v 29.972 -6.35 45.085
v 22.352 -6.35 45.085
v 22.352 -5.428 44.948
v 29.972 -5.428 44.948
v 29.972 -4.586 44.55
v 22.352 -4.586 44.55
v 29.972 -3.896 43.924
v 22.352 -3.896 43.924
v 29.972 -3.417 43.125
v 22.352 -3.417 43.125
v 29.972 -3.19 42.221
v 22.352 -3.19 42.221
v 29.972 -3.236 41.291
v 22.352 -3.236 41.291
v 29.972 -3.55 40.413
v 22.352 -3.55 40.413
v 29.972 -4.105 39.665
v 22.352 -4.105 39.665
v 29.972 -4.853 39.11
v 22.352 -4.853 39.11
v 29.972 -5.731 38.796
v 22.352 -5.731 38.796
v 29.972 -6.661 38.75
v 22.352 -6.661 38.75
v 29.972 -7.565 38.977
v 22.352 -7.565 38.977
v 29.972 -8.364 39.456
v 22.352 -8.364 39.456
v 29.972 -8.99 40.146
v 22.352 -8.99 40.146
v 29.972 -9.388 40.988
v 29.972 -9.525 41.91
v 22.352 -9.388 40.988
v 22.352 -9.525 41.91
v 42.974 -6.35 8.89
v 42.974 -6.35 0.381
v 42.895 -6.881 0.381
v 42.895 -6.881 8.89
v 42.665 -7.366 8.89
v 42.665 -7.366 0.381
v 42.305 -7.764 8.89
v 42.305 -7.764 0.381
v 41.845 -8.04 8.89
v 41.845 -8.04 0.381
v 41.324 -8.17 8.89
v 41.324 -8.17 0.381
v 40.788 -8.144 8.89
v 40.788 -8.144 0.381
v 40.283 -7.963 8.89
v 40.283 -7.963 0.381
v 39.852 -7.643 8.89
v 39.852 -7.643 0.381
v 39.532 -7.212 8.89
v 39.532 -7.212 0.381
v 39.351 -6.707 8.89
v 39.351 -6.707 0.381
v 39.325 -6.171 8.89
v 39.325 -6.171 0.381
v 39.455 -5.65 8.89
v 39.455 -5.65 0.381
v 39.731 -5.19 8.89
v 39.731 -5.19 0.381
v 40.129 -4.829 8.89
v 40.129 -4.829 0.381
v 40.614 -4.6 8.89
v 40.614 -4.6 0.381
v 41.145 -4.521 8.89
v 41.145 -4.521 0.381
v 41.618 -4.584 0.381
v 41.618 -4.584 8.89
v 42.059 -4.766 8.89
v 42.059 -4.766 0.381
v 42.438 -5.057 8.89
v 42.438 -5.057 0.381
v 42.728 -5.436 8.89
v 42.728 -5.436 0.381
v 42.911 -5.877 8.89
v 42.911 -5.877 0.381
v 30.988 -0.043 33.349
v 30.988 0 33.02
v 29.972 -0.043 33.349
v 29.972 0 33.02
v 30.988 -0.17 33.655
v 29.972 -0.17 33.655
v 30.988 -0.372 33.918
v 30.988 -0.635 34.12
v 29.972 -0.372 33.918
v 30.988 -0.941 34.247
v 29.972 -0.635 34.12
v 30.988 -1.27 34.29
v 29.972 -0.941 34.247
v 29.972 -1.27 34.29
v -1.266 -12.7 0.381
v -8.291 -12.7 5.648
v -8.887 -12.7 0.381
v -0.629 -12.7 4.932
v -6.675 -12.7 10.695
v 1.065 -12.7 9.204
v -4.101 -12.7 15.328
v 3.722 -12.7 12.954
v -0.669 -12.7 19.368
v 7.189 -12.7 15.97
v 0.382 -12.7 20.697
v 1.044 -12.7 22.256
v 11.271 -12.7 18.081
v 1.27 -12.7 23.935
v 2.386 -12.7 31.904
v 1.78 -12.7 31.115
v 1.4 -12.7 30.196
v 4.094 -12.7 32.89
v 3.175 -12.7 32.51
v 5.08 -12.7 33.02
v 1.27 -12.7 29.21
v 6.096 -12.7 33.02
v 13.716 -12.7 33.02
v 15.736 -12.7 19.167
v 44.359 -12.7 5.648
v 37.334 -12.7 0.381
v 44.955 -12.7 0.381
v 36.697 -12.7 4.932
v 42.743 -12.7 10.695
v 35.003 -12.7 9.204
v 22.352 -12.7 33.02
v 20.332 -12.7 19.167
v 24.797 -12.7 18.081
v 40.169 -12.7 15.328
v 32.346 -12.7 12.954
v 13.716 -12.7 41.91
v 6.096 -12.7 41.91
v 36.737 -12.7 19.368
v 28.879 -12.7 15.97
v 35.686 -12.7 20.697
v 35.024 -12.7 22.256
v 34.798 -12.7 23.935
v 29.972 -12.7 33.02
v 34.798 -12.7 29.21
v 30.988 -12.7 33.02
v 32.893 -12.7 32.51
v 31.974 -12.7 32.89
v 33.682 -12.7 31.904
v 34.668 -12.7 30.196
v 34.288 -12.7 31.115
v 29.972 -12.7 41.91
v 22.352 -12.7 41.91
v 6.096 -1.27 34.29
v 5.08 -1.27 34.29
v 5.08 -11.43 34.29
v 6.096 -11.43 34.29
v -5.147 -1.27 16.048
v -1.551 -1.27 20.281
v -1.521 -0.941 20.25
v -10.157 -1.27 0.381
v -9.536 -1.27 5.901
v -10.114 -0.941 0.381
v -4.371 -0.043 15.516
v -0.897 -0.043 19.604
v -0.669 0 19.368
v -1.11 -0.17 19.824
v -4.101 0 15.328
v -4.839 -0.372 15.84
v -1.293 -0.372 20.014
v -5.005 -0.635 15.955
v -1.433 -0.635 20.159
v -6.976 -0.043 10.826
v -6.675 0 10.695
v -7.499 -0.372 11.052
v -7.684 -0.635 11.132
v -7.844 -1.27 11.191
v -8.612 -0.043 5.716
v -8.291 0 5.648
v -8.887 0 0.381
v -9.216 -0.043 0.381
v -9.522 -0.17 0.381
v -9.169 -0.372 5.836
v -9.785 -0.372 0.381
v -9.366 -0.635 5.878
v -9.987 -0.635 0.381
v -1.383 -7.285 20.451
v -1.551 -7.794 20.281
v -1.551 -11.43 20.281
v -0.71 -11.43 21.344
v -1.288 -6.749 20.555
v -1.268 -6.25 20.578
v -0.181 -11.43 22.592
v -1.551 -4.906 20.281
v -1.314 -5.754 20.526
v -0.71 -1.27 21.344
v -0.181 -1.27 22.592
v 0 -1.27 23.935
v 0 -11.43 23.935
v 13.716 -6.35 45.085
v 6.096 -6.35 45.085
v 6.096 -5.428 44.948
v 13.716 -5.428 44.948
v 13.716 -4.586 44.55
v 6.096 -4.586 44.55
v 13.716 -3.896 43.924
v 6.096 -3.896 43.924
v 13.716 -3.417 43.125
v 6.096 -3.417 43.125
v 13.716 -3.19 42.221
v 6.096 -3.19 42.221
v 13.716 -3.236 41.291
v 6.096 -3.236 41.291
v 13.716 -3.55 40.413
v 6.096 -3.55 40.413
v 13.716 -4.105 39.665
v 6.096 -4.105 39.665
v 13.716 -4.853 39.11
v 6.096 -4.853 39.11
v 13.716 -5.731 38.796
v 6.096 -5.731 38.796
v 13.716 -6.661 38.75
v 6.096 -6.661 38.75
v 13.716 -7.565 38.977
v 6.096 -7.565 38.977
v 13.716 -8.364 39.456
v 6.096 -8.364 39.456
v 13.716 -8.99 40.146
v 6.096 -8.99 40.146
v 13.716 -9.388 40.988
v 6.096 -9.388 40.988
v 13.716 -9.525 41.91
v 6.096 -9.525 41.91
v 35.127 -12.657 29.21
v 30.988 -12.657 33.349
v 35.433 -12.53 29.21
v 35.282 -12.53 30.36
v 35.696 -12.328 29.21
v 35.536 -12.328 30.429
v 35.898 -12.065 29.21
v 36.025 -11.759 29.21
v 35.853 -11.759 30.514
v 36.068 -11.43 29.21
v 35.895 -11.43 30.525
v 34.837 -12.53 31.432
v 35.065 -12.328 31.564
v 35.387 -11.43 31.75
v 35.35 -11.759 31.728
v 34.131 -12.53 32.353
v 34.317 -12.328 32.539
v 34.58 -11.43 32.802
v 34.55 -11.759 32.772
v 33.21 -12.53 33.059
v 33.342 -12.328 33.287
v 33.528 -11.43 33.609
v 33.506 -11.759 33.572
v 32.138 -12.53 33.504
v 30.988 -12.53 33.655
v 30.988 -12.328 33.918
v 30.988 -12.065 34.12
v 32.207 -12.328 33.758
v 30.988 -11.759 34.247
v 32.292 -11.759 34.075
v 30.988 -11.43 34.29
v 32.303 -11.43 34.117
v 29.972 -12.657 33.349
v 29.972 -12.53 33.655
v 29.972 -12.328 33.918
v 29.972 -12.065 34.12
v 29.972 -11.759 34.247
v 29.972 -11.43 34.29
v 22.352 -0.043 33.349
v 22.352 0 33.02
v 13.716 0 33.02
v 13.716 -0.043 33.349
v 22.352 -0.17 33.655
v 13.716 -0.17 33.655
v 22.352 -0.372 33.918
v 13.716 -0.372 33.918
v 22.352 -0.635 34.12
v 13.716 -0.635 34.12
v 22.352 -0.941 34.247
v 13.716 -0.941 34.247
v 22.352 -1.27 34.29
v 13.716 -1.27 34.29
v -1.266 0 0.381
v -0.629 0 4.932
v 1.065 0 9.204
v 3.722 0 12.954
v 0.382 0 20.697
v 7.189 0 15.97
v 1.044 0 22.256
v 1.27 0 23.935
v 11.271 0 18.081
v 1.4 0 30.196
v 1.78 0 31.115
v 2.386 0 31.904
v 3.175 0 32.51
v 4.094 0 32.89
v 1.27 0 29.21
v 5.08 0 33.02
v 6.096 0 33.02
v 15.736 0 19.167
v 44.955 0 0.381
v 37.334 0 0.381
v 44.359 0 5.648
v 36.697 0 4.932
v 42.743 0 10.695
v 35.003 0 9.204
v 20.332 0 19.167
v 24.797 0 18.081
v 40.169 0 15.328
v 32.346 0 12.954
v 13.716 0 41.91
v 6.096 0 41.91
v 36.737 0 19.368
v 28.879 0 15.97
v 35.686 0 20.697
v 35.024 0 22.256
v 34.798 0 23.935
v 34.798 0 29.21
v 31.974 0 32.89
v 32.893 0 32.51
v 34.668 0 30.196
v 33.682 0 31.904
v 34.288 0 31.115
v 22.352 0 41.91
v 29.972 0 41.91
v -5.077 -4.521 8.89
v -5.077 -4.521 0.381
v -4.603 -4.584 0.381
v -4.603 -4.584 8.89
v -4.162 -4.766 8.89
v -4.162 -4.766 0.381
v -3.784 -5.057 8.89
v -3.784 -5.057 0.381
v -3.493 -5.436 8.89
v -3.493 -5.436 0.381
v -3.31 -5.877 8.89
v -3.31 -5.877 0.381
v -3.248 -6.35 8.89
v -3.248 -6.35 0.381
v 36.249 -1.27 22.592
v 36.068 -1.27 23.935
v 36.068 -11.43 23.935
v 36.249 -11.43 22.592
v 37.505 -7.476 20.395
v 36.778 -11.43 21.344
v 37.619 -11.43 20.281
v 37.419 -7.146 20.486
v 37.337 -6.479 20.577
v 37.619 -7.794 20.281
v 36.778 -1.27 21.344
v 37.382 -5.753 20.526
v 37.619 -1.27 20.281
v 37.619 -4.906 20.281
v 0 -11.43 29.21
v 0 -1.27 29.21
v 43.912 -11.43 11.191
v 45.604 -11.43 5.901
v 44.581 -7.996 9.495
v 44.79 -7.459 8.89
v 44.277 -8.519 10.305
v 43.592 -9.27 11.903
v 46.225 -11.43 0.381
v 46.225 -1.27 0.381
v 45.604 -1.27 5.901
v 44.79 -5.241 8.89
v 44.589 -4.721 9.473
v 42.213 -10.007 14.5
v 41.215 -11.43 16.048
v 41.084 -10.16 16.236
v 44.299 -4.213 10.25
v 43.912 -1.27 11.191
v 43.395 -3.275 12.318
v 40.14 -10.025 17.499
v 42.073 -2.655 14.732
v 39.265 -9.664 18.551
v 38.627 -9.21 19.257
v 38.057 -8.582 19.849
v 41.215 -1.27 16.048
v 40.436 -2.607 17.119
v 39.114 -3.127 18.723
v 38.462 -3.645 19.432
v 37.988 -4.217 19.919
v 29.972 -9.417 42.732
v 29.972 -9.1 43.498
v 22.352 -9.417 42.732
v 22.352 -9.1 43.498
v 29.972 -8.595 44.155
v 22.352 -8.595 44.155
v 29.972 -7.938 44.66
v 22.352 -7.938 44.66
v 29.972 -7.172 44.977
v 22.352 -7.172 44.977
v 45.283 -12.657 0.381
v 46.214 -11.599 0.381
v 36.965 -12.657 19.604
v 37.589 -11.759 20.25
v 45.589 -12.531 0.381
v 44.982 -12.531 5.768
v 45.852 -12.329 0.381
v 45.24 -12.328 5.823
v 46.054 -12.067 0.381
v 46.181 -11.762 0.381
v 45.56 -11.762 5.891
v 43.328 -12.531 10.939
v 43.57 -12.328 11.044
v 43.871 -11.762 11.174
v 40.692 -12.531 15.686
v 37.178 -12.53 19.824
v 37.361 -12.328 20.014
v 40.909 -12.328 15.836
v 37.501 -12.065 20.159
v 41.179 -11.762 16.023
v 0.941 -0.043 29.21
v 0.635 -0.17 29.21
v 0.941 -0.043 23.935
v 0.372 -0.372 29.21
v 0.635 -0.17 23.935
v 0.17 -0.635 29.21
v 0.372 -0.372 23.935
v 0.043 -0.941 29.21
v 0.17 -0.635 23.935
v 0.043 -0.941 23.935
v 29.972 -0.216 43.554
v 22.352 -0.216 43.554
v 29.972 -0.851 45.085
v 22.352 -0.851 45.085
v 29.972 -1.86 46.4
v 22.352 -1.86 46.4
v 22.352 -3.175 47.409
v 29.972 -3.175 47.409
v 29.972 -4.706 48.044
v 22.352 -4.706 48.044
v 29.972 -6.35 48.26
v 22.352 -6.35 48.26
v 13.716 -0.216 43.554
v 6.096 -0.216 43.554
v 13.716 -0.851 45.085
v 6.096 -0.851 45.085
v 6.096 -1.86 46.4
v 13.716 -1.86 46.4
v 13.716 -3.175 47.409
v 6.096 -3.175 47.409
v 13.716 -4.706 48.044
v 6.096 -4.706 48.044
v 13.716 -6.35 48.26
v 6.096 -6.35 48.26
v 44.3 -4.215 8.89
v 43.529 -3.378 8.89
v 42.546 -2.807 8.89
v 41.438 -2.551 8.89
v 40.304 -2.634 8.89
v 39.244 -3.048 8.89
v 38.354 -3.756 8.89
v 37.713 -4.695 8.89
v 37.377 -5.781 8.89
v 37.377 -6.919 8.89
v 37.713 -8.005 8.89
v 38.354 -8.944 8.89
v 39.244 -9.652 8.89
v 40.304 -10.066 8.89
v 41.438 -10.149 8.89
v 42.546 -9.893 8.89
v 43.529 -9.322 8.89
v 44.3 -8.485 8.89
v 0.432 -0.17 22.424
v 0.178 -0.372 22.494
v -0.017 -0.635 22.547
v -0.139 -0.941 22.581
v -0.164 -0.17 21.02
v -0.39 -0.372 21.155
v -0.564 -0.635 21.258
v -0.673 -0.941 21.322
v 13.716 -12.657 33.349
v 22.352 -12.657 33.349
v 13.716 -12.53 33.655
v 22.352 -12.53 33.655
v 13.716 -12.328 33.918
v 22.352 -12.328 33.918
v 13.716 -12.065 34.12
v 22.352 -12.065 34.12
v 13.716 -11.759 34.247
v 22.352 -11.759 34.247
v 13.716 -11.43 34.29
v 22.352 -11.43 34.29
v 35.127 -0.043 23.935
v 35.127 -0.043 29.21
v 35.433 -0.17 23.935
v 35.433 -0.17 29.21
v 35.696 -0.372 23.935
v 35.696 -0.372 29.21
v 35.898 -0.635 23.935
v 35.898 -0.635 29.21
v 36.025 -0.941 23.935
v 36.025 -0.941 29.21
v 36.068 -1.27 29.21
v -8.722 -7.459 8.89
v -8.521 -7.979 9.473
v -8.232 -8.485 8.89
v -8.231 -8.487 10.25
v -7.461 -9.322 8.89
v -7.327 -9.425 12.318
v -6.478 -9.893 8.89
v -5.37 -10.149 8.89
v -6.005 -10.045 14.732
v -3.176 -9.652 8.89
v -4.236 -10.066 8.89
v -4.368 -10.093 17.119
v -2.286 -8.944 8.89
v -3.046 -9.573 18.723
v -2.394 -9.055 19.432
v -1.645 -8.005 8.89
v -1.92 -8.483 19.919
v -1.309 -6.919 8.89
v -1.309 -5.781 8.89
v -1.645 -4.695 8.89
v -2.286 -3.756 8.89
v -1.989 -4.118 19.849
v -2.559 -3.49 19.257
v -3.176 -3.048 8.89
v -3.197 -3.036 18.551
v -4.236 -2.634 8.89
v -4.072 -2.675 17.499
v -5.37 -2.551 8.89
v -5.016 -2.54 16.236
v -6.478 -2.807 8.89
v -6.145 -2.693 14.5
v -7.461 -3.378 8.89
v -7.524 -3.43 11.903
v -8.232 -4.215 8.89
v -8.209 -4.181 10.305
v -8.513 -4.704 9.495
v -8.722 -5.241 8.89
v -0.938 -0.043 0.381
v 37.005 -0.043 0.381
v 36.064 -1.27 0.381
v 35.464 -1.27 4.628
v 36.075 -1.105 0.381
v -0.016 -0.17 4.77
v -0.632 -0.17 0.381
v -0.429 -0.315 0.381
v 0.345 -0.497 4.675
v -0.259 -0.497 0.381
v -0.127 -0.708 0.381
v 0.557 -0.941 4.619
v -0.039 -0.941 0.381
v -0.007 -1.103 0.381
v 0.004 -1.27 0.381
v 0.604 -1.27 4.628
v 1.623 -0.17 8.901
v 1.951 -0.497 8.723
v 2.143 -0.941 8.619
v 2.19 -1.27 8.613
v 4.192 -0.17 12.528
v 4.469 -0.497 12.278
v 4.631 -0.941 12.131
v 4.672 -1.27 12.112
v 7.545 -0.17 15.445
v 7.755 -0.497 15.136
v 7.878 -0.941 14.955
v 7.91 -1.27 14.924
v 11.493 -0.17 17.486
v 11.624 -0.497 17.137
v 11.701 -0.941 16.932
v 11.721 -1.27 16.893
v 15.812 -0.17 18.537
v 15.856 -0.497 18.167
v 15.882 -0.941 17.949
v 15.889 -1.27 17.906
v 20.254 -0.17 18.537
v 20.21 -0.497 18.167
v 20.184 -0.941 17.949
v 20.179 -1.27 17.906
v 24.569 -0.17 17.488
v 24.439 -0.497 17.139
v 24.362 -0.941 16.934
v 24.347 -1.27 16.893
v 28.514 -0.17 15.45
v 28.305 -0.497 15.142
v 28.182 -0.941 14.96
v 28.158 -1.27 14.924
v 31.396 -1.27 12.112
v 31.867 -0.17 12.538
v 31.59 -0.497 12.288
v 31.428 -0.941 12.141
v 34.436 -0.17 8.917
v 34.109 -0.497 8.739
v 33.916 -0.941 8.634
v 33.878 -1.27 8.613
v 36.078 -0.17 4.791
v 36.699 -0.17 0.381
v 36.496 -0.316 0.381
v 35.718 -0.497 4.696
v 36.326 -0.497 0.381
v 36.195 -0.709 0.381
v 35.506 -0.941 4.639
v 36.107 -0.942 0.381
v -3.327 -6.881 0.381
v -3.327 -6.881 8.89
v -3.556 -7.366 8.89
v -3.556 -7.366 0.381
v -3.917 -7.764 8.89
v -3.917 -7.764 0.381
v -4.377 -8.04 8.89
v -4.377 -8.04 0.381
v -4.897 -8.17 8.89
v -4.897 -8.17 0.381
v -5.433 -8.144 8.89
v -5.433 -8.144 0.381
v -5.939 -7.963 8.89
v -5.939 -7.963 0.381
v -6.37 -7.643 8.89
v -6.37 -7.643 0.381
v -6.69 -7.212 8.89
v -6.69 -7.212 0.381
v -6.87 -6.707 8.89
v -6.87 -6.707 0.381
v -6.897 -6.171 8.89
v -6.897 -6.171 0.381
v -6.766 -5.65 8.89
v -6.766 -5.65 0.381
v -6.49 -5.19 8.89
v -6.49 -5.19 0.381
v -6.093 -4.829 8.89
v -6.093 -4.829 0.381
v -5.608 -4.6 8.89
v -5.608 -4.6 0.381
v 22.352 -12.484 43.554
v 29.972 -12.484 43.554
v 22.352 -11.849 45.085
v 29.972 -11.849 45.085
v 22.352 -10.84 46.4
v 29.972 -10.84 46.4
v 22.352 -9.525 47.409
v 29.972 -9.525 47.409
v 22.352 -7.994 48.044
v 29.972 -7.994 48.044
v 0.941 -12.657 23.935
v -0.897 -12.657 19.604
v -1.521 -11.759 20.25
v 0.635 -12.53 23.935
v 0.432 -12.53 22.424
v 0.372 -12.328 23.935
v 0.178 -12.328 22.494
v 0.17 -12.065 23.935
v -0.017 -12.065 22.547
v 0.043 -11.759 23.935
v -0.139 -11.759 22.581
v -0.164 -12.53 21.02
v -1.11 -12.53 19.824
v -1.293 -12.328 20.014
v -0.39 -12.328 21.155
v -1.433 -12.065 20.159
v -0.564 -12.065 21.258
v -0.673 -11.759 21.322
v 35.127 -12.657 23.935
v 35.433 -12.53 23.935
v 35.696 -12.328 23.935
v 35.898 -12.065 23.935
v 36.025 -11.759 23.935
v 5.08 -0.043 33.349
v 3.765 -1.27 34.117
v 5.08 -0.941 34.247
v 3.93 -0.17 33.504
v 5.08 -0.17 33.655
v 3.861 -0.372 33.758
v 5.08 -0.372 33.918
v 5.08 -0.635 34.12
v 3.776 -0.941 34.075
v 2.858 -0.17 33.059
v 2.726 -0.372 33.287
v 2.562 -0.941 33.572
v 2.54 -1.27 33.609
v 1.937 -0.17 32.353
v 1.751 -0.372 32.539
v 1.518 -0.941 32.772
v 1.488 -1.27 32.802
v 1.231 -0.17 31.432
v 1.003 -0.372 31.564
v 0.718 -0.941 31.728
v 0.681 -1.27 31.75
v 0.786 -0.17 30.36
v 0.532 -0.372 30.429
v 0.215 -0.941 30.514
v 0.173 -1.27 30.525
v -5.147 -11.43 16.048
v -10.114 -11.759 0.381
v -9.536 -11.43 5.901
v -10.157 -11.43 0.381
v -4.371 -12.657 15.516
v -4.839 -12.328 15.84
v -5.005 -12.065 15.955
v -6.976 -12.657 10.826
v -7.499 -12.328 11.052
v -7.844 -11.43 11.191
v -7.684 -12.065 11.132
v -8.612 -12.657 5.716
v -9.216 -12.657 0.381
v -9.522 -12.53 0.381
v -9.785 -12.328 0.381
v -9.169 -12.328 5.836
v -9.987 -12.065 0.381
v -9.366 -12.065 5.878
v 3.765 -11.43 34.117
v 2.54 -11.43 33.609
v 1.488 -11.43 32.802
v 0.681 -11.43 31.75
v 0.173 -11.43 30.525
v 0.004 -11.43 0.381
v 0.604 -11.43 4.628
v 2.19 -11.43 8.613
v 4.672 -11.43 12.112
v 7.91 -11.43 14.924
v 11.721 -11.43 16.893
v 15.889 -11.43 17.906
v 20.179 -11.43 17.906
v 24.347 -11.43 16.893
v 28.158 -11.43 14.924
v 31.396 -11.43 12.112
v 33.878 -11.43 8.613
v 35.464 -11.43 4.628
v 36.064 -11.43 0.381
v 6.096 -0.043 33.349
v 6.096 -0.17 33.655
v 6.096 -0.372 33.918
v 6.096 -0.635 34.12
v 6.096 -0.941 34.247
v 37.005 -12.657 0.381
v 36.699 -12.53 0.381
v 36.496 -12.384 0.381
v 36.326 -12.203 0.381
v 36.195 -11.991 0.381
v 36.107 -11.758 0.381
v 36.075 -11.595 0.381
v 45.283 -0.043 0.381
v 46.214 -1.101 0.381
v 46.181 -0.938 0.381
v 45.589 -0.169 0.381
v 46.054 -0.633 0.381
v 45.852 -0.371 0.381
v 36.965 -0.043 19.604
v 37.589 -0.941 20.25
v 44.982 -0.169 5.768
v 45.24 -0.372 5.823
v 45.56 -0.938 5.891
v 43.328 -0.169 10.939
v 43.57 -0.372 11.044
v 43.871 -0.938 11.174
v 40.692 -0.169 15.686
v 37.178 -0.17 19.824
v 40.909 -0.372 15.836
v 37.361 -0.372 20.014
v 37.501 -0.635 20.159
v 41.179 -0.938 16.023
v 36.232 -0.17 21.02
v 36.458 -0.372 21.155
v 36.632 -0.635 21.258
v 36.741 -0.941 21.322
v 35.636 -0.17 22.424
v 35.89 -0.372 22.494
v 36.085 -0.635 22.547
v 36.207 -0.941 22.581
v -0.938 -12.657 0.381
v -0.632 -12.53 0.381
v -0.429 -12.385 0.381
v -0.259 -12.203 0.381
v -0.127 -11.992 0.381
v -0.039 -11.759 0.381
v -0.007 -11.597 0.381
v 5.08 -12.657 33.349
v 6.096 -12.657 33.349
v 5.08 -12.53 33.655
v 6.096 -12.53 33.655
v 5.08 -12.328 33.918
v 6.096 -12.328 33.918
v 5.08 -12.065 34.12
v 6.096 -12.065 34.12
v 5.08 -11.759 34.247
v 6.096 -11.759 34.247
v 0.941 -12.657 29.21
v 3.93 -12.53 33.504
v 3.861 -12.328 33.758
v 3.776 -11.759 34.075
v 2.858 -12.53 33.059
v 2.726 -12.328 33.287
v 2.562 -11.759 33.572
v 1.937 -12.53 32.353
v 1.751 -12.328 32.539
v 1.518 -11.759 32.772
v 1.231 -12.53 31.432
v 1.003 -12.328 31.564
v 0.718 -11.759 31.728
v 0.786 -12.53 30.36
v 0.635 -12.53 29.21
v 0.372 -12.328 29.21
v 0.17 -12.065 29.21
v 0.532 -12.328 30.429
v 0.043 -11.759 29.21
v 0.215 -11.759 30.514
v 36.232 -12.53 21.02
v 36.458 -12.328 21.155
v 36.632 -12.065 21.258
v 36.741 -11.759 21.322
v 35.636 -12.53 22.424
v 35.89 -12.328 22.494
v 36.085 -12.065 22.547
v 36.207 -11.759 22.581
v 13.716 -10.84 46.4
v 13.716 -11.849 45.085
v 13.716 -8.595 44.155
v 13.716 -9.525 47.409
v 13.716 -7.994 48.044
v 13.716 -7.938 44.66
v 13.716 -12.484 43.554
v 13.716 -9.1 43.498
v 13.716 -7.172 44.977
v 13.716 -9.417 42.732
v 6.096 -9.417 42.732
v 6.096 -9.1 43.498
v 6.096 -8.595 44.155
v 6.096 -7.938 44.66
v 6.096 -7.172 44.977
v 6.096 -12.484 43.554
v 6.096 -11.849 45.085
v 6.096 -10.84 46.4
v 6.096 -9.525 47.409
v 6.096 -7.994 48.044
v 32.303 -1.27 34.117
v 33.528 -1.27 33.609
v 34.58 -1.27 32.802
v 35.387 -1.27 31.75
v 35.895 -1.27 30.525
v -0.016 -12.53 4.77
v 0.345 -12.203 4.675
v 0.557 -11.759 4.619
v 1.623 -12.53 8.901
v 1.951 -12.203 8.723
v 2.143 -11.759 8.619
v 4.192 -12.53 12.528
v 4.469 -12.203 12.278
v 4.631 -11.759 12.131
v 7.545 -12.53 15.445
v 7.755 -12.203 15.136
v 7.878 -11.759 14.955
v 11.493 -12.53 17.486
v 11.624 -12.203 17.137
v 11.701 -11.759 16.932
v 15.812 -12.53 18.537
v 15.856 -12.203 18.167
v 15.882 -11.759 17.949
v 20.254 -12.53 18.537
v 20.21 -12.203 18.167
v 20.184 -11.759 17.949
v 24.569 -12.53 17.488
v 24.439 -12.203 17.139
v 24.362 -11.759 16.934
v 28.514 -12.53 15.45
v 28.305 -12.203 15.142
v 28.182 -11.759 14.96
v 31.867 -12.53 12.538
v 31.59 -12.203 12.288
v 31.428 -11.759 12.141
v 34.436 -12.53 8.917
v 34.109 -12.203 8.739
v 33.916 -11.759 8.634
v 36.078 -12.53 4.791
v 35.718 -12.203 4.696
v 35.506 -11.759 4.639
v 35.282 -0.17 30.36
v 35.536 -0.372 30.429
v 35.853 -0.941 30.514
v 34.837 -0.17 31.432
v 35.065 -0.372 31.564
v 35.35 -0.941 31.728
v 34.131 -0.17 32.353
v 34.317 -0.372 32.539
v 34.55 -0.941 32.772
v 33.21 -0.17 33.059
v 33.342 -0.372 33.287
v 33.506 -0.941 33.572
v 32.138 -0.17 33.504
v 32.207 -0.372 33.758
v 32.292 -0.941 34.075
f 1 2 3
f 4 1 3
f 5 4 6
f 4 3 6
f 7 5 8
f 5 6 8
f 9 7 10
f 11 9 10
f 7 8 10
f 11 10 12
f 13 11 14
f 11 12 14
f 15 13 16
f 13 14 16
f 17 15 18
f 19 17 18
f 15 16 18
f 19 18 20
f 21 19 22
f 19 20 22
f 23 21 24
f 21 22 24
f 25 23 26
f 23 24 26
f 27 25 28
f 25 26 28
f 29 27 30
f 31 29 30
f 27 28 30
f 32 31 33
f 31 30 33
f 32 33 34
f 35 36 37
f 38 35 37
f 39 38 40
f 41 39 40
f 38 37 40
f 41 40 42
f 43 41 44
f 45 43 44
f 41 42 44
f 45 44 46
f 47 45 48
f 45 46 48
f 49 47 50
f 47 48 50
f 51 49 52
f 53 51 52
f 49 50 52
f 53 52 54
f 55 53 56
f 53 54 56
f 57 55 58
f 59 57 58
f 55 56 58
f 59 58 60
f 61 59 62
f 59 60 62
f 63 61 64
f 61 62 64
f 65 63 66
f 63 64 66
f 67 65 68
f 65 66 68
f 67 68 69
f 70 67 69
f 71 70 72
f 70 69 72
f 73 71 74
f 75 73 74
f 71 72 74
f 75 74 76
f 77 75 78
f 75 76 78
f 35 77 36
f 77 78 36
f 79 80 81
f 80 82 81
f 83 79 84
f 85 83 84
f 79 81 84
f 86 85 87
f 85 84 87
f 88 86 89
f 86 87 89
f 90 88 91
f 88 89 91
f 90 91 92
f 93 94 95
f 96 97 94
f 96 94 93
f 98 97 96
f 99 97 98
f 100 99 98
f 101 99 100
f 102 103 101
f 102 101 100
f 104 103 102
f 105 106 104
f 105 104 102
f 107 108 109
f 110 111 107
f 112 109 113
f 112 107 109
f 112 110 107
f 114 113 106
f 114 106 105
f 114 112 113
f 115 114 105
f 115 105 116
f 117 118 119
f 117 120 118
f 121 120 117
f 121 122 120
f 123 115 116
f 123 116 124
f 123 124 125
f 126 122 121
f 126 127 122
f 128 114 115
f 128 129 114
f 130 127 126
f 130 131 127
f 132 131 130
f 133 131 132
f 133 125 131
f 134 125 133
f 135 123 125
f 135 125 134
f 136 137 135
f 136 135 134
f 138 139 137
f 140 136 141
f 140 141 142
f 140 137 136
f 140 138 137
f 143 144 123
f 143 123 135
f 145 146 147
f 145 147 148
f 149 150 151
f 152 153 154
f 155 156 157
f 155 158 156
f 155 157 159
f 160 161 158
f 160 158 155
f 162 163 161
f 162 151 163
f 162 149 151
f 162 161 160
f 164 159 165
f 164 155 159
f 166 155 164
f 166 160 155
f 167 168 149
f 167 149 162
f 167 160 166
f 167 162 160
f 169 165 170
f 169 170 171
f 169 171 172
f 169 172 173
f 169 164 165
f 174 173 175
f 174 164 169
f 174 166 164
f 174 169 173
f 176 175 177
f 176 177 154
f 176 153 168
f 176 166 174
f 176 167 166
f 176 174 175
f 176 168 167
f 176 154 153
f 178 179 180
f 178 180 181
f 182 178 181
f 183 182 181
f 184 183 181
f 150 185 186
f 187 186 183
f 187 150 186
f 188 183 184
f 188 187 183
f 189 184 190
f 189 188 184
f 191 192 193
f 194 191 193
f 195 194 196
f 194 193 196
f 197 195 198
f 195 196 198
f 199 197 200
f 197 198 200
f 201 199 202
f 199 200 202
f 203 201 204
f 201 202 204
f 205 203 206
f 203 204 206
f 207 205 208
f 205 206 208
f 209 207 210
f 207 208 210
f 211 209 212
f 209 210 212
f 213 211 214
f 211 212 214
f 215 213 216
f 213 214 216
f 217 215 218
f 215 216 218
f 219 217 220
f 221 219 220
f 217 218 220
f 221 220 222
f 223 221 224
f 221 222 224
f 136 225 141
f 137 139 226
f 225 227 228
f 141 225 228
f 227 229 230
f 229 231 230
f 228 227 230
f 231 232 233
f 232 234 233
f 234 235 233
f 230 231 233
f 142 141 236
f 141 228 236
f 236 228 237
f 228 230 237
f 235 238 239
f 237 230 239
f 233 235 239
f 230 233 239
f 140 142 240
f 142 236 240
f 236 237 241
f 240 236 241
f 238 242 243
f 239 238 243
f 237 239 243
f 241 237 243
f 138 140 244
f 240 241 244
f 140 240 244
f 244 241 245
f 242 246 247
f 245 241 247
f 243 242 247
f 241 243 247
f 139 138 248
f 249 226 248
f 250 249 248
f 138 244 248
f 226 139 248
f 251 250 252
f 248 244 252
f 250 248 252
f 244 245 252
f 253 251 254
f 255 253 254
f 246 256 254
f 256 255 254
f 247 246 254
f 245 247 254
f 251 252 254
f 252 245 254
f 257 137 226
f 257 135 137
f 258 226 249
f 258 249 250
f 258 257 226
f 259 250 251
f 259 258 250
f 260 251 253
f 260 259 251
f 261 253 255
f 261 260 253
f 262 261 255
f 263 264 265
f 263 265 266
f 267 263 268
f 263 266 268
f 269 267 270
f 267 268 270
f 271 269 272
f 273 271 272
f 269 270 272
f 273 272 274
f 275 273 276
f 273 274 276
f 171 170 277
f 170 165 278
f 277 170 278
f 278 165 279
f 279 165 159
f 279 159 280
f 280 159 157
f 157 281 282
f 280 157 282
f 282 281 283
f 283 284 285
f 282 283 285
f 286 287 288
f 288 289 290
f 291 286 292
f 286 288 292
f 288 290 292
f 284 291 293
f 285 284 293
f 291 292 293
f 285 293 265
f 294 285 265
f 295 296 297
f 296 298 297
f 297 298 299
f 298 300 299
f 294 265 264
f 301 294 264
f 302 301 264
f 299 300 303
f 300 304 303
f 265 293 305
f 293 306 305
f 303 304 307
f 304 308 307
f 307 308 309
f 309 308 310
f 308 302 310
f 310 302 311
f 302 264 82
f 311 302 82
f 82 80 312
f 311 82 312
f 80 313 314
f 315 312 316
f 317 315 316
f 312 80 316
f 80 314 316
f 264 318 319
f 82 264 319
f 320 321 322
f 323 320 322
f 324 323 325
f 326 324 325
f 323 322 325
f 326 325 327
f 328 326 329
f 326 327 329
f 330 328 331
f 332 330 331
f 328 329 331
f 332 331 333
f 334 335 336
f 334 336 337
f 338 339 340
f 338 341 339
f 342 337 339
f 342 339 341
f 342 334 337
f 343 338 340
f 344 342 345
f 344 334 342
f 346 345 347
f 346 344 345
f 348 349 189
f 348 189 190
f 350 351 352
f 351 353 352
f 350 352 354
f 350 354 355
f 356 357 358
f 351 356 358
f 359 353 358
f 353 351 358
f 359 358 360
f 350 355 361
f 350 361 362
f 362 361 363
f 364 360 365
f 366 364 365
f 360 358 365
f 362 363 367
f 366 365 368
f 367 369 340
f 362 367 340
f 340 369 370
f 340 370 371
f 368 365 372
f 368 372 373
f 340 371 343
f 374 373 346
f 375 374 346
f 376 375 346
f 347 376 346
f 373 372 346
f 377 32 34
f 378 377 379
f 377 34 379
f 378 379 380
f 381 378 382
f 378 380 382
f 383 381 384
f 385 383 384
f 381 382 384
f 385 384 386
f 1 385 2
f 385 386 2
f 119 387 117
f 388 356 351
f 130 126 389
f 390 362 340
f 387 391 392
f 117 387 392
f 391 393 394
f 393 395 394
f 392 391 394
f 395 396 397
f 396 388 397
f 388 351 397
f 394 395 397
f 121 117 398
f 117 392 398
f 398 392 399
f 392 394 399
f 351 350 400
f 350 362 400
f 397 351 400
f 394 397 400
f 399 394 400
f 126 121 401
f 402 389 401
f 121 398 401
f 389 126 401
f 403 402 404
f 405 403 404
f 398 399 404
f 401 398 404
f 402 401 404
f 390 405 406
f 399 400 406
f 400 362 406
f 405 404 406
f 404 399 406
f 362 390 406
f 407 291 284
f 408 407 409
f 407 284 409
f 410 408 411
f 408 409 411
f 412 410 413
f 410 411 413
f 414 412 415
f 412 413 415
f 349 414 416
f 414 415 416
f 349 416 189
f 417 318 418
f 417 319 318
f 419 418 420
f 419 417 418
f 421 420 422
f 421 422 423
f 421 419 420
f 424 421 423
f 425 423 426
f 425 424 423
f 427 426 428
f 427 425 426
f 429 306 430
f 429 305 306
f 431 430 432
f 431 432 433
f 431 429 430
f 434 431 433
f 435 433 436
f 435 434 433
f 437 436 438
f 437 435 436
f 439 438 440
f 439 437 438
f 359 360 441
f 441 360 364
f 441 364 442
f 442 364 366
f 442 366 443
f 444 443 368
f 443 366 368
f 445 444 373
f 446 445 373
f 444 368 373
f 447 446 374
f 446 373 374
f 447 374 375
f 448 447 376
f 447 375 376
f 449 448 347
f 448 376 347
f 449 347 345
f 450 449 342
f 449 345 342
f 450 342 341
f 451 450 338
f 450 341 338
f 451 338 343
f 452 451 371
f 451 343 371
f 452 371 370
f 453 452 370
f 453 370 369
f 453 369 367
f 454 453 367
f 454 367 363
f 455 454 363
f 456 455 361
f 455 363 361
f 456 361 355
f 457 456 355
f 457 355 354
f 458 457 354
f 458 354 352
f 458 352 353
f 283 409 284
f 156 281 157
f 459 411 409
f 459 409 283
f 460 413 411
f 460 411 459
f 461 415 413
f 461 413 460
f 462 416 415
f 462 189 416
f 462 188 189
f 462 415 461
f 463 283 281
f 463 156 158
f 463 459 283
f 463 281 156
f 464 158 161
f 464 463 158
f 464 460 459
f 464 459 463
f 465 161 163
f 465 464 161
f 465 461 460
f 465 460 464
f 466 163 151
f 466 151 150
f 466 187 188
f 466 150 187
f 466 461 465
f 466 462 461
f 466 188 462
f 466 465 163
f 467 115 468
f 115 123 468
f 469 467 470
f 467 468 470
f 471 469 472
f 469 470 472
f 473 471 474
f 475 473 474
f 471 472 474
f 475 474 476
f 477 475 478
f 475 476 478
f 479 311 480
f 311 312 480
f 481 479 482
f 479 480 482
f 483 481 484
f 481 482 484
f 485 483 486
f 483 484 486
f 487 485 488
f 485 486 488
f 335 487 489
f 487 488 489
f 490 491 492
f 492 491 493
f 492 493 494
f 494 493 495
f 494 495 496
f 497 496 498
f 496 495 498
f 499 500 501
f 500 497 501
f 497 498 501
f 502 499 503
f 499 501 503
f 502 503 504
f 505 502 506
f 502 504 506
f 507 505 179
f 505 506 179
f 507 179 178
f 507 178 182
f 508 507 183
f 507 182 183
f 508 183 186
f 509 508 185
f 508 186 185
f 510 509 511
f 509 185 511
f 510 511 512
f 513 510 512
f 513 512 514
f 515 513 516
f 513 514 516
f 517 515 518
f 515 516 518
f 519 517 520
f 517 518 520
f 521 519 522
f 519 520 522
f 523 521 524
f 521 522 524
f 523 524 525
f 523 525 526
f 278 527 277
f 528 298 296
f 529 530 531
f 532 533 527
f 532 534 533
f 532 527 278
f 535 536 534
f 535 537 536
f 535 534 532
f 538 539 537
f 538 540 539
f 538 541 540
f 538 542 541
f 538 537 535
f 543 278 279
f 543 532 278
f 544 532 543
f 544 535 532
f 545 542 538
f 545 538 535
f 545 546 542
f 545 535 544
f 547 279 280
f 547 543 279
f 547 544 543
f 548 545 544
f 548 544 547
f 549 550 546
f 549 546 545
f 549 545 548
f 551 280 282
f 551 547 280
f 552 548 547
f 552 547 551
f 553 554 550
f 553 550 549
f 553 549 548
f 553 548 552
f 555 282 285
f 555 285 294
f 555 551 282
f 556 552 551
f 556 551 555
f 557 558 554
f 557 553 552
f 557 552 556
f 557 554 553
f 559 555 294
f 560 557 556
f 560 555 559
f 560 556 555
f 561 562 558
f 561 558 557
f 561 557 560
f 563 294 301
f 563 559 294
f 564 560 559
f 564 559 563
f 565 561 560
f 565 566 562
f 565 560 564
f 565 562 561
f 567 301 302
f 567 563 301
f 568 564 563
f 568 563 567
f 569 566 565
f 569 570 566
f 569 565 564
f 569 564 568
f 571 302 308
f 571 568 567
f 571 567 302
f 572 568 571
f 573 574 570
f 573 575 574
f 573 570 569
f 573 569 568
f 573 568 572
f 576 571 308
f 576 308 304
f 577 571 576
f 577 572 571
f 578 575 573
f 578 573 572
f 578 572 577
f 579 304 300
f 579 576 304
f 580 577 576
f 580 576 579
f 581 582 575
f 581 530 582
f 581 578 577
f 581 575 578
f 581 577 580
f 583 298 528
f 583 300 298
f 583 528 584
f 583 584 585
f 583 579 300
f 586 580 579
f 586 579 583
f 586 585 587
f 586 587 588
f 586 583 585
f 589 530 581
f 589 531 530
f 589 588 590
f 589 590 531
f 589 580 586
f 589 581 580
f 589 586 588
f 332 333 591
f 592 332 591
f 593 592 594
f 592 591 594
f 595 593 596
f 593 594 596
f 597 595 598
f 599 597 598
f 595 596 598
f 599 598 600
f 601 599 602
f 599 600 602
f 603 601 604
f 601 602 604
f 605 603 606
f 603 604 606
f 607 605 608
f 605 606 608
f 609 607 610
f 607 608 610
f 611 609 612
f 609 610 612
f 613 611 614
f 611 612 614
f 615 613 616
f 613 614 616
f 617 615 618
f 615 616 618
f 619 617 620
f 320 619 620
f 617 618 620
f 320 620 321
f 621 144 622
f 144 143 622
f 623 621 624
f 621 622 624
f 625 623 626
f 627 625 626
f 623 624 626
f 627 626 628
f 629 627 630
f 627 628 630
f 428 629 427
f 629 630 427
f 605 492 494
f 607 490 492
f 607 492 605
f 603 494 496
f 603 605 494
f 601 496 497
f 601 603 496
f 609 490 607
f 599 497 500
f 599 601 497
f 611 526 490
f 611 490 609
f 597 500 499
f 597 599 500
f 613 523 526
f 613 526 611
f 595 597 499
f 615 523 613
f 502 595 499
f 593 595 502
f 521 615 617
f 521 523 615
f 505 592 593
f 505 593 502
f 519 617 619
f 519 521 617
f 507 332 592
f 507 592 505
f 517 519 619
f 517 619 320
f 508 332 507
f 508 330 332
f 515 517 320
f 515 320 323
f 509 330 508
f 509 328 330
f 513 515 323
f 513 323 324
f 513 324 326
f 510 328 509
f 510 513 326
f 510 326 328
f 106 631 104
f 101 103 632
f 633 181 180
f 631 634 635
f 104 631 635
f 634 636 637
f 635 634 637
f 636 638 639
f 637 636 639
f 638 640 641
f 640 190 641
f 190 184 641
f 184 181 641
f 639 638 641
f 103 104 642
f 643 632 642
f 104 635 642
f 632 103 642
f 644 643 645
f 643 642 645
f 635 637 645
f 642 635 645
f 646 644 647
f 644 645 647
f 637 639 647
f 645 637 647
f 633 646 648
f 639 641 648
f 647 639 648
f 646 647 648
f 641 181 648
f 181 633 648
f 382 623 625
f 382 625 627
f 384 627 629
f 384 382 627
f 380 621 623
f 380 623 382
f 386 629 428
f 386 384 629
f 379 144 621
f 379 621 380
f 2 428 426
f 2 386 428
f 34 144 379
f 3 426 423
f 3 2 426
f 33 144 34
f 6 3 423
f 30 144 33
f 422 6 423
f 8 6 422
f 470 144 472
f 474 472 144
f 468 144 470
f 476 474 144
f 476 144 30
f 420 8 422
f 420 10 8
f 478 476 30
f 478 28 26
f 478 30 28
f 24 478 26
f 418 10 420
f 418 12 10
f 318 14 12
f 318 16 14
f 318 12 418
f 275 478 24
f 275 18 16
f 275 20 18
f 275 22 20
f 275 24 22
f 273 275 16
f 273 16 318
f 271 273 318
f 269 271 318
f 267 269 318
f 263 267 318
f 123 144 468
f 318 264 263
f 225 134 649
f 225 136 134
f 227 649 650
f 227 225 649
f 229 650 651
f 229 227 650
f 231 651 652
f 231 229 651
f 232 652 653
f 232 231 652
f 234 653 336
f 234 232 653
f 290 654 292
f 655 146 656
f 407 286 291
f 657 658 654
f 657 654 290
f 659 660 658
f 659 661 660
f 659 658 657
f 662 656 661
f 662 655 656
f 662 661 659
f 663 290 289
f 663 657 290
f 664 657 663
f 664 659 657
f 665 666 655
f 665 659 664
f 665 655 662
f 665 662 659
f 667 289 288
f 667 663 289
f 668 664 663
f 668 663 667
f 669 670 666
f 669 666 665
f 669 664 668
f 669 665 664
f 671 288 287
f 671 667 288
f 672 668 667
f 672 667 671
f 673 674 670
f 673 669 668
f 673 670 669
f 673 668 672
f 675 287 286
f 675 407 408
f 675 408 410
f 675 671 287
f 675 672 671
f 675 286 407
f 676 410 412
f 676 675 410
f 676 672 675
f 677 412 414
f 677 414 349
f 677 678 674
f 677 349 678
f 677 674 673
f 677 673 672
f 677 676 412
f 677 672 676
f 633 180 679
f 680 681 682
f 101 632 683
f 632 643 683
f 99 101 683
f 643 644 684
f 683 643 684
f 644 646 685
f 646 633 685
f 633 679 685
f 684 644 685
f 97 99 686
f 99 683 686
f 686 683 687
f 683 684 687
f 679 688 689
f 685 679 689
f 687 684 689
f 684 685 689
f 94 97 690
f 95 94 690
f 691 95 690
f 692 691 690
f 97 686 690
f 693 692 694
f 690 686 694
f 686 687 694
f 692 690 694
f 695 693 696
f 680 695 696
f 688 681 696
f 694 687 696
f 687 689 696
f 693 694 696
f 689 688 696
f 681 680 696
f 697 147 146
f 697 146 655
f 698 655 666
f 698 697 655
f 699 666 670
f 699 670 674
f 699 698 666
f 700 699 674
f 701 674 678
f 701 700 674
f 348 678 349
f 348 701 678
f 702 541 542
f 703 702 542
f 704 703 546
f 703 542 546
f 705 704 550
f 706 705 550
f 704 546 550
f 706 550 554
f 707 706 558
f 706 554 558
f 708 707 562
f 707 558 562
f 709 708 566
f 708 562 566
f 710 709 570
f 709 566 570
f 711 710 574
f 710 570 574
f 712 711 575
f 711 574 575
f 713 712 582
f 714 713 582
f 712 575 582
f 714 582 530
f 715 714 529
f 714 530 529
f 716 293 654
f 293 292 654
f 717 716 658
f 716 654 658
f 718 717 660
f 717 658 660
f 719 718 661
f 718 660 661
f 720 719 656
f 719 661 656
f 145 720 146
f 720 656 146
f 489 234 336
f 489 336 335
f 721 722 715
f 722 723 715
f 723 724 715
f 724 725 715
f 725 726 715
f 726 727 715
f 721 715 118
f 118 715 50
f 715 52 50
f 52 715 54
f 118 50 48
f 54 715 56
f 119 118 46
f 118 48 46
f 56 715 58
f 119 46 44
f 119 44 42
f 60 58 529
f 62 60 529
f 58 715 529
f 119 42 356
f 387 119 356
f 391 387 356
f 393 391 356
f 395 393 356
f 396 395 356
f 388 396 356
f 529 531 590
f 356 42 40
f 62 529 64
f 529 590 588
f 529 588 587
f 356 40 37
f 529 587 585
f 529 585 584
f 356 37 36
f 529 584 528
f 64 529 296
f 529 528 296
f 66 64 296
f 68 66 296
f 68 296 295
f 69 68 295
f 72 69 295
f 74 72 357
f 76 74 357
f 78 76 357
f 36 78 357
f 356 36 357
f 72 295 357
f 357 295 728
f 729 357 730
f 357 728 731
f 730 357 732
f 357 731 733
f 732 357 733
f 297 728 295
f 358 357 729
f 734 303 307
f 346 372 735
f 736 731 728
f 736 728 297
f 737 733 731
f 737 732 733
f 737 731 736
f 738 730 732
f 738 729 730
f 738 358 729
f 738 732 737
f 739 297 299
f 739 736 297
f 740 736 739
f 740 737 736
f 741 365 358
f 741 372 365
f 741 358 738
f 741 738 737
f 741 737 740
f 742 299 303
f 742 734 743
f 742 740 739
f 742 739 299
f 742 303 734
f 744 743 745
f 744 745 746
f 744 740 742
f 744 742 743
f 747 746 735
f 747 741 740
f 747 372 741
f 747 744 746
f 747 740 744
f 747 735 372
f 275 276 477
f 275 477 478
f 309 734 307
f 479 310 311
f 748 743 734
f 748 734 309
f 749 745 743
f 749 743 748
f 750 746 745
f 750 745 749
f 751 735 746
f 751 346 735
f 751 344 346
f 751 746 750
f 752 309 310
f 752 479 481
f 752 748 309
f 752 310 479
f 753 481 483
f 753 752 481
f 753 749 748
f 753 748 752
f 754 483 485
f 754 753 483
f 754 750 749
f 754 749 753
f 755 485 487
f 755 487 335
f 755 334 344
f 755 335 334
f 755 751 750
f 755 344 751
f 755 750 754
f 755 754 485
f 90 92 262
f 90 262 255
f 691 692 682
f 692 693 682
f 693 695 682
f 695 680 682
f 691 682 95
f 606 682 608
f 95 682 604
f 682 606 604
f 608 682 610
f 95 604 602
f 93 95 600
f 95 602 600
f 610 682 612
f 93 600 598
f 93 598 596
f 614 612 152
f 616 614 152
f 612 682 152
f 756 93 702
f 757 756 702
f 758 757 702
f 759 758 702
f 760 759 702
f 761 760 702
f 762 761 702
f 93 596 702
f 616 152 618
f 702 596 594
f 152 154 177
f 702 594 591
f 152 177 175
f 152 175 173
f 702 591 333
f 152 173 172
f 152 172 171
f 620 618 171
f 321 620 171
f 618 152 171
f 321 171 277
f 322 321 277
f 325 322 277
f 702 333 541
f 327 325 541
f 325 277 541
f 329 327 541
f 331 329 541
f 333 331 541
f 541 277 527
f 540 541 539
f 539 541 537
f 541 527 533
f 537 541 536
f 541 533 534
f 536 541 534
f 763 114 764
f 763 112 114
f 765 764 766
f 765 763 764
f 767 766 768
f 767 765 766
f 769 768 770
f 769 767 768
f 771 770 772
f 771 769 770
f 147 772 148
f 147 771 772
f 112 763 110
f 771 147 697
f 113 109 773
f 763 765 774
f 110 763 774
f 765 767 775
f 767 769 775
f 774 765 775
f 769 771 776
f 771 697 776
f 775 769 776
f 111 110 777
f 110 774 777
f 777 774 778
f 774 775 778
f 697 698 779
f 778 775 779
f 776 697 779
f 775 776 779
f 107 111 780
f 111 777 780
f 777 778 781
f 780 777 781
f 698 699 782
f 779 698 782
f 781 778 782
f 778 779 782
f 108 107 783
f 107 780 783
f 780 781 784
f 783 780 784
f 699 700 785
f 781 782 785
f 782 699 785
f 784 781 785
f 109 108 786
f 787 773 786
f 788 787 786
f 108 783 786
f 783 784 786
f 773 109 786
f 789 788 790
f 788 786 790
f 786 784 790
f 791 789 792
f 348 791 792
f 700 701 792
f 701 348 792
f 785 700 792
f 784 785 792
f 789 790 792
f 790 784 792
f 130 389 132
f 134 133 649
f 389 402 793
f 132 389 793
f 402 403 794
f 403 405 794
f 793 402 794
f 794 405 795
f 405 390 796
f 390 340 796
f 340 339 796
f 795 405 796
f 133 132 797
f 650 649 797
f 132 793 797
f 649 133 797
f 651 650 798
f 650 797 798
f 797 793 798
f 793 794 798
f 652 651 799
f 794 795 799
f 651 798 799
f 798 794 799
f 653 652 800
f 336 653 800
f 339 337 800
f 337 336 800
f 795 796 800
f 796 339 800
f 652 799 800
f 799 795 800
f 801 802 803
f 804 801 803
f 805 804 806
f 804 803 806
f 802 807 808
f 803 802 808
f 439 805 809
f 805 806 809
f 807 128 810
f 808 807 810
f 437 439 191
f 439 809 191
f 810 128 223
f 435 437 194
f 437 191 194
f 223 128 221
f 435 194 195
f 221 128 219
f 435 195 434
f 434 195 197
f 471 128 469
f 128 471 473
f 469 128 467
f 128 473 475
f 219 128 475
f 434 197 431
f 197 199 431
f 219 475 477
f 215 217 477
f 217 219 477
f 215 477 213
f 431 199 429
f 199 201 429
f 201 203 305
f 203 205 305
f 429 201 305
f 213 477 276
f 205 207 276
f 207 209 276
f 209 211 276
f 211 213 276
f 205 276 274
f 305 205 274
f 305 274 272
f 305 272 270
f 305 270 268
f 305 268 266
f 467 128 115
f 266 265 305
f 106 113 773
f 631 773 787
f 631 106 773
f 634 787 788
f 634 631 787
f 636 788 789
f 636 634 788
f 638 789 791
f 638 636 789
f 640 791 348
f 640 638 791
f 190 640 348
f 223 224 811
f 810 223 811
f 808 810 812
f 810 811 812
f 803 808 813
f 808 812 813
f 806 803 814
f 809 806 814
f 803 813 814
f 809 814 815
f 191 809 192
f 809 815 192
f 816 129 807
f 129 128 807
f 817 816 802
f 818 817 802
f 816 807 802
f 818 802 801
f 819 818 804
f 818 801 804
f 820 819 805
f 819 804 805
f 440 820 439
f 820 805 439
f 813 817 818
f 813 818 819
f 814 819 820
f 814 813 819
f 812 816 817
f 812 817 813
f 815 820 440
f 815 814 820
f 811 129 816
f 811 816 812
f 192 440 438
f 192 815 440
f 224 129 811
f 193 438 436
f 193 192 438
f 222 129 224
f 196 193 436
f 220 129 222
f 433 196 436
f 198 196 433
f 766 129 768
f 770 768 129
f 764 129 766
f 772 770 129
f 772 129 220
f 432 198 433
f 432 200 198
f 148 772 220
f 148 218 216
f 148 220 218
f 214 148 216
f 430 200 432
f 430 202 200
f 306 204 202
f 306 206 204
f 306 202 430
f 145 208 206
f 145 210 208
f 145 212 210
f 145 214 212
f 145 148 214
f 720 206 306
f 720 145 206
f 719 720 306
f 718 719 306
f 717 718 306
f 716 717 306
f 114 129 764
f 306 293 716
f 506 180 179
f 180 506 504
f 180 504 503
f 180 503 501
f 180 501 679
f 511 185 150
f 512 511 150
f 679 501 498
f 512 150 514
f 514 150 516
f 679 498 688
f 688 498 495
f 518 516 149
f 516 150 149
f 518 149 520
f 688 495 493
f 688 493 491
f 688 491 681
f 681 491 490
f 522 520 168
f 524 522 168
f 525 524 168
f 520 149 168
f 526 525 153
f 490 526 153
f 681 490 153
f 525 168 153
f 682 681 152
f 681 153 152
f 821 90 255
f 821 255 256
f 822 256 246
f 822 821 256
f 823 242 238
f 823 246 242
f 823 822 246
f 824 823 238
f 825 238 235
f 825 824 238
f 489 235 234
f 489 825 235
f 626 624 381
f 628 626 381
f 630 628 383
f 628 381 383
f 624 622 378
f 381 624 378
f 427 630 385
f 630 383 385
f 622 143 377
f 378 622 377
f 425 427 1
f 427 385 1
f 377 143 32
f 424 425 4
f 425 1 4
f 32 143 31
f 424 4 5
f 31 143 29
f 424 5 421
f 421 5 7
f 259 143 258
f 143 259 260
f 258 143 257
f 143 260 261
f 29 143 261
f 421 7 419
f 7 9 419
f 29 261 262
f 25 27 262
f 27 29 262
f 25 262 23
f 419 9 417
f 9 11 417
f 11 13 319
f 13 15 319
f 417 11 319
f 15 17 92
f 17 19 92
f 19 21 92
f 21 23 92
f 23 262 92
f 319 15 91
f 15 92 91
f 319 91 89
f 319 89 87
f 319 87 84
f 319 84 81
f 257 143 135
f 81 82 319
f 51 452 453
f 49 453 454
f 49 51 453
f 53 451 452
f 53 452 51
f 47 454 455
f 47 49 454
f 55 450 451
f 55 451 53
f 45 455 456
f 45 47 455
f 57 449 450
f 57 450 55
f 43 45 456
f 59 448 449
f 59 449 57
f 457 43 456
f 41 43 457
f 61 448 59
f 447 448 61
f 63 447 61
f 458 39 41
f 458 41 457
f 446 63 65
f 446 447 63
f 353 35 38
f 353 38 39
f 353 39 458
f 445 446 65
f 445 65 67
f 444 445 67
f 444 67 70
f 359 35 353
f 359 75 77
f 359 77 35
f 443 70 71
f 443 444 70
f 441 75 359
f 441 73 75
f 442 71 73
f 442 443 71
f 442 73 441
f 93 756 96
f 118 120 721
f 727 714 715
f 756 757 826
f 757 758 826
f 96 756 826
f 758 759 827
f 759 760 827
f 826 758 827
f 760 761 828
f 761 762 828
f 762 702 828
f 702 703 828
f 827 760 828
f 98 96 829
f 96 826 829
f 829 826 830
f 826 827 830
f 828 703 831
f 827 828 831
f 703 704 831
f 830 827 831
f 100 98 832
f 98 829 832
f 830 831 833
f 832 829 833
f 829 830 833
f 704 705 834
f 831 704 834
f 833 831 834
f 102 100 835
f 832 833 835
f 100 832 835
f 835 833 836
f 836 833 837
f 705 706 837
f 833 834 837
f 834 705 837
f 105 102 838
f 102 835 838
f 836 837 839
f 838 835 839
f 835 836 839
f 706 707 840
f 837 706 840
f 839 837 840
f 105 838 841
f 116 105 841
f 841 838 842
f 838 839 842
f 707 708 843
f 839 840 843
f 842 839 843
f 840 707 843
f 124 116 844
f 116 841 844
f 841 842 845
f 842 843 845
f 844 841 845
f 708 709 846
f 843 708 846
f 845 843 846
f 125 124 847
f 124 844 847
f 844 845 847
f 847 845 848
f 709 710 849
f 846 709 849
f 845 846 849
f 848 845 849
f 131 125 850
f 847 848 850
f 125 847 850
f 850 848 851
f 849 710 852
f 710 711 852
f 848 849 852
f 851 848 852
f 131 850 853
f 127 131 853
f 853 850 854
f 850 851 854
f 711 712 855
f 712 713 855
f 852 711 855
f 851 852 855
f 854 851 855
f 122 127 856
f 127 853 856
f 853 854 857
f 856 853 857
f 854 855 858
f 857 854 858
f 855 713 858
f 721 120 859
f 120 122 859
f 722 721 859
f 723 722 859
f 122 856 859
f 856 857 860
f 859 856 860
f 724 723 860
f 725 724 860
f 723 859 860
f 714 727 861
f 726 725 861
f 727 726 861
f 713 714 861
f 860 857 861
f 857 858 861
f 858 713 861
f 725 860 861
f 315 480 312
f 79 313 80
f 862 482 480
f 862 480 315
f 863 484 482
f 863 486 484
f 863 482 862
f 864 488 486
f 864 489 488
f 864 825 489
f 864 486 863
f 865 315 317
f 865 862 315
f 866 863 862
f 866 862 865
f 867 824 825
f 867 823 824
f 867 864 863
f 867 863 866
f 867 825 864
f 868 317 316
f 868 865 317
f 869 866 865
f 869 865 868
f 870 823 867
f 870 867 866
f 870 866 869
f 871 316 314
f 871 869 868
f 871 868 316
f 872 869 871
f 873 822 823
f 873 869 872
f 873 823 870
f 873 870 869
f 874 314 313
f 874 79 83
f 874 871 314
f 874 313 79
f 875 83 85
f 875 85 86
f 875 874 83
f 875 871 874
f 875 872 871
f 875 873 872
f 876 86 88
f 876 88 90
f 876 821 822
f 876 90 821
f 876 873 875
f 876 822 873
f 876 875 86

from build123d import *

# Parameters (mm, degrees)
F1_DEPTH  = 12.7
F5_W      = 7.62
F5_H      = 12.7
F6_DEPTH  = 13.97
F8_DEPTH  = 23.876
F9_R      = 6.34999
F10_R     = 5.08
F12_REACH = 53.0526275257
F14_REACH = 53.0526275257
F15_R     = 3.81
F16_DEPTH = 25.4
F17_R     = 1.27


# Not quite as in the source:
# - a fillet or chamfer is up to 0.001 mm smaller than in the source, because OpenCascade refuses the exact size


with BuildPart() as f1:
    # F0 (on Front) → F1 (new body)
    with BuildSketch(Plane.XZ):
        with BuildLine():
            Line((-10.1574255581, 0.381), (0.0040250971, 0.381))
            ThreePointArc((0.0040250971, 0.381), (18.034, 18.034), (36.0639749029, 0.381))
            Line((36.0639749029, 0.381), (46.2254255581, 0.381))
            ThreePointArc((46.2254255581, 0.381), (18.034, 28.194), (-10.1574255581, 0.381))
        make_face()
    extrude(amount=F1_DEPTH)

    # F3 (on offset) → F4 (join, up to the next surface of F1)
    with BuildSketch(Plane.XY.offset(34.29)):
        Polygon((18.034, 0), (0, 0), (0, -12.7), (36.068, -12.7), (36.068, 0), align=None)
    extrude(until=Until.NEXT, dir=(0, 0, -1))

    # F5 (on face) → F6 (join)
    with BuildSketch(Plane.XY.offset(34.29)):
        with Locations((9.906, -6.35)):
            Rectangle(F5_W, F5_H)
        with Locations((26.162, -6.35)):
            Rectangle(F5_W, F5_H)
    extrude(amount=F6_DEPTH)

    # F7 (on face) → F8 (cut, through all)
    with BuildSketch(Plane(origin=(6.096, 0, 0), x_dir=(0, -1, 0), z_dir=(-1, 0, 0))):
        with BuildLine():
            ThreePointArc((6.35, 45.085), (4.1049359697, 39.6649359697), (9.525, 41.91))
            ThreePointArc((9.525, 41.91), (8.5950640303, 44.1550640303), (6.35, 45.085))
        make_face()
    extrude(amount=-F8_DEPTH, mode=Mode.SUBTRACT)

    # F9 (radius 6.35 in the source; OpenCascade refuses exactly that, so slightly less here)
    f9_edges = [f1.edges().sort_by_distance(p)[0] for p in [
        (9.906, -12.7, 48.26),
        (26.162, -12.7, 48.26),
        (9.906, 0, 48.26),
        (26.162, 0, 48.26),
    ]]
    fillet(f9_edges, radius=F9_R)

    # F10
    f10_edges = [f1.edges().sort_by_distance(p)[0] for p in [
        (36.068, -6.35, 34.29),
        (36.068, -6.35, 21.672021),
        (0, -6.35, 34.29),
        (0, -6.35, 21.672021),
    ]]
    fillet(f10_edges, radius=F10_R)

    f12_end = f1.faces().sort_by_distance((-7.8436707665, -6.35, 11.1914159829))[0]
    # F11 (on face) → F12 (cut, up to a face of the model that its end follows)
    with BuildSketch(Plane(origin=(0, 0, 0.381), x_dir=(1, 0, 0), z_dir=(0, 0, -1))):
        with BuildLine():
            ThreePointArc((-3.2479002305, 6.35), (-6.369857112, 7.6431568814), (-5.0767002305, 4.5212))
            ThreePointArc((-5.0767002305, 4.5212), (-3.7835433491, 5.0568431186), (-3.2479002305, 6.35))
        make_face()
    f12_long = extrude(amount=-F12_REACH, mode=Mode.PRIVATE)
    add(split(f12_long, bisect_by=f12_end, keep=Keep.BOTTOM, mode=Mode.PRIVATE), mode=Mode.SUBTRACT)

    f14_end = f1.faces().sort_by_distance((43.9116707665, -6.35, 11.1914159829))[0]
    # F13 (on face) → F14 (cut, up to a face of the model that its end follows)
    with BuildSketch(Plane(origin=(0, 0, 0.381), x_dir=(1, 0, 0), z_dir=(0, 0, -1))):
        with BuildLine():
            ThreePointArc((42.9735002305, 6.35), (39.8515433491, 7.6431568814), (41.1447002305, 4.5212))
            ThreePointArc((41.1447002305, 4.5212), (42.437857112, 5.0568431186), (42.9735002305, 6.35))
        make_face()
    f14_long = extrude(amount=-F14_REACH, mode=Mode.PRIVATE)
    add(split(f14_long, bisect_by=f14_end, keep=Keep.BOTTOM, mode=Mode.PRIVATE), mode=Mode.SUBTRACT)

    # F15 (on face) → F16 (cut)
    with BuildSketch(Plane.XY.offset(34.29)):
        with Locations((-5.0767002305, -6.35)):
            Circle(F15_R)
        with Locations((41.1447002305, -6.35)):
            Circle(F15_R)
    extrude(amount=-F16_DEPTH, mode=Mode.SUBTRACT)

    # F17
    f17_edges = [f1.edges().sort_by_distance(p)[0] for p in [
        (18.034, 0, 18.034),
        (-7.843671, 0, 11.191416),
        (-7.843671, -12.7, 11.191416),
        (43.911671, -12.7, 11.191416),
        (18.034, -12.7, 18.034),
        (43.911671, 0, 11.191416),
        (18.034, -12.7, 34.29),
        (18.034, 0, 34.29),
    ]]
    fillet(f17_edges, radius=F17_R)


solid = f1.part
